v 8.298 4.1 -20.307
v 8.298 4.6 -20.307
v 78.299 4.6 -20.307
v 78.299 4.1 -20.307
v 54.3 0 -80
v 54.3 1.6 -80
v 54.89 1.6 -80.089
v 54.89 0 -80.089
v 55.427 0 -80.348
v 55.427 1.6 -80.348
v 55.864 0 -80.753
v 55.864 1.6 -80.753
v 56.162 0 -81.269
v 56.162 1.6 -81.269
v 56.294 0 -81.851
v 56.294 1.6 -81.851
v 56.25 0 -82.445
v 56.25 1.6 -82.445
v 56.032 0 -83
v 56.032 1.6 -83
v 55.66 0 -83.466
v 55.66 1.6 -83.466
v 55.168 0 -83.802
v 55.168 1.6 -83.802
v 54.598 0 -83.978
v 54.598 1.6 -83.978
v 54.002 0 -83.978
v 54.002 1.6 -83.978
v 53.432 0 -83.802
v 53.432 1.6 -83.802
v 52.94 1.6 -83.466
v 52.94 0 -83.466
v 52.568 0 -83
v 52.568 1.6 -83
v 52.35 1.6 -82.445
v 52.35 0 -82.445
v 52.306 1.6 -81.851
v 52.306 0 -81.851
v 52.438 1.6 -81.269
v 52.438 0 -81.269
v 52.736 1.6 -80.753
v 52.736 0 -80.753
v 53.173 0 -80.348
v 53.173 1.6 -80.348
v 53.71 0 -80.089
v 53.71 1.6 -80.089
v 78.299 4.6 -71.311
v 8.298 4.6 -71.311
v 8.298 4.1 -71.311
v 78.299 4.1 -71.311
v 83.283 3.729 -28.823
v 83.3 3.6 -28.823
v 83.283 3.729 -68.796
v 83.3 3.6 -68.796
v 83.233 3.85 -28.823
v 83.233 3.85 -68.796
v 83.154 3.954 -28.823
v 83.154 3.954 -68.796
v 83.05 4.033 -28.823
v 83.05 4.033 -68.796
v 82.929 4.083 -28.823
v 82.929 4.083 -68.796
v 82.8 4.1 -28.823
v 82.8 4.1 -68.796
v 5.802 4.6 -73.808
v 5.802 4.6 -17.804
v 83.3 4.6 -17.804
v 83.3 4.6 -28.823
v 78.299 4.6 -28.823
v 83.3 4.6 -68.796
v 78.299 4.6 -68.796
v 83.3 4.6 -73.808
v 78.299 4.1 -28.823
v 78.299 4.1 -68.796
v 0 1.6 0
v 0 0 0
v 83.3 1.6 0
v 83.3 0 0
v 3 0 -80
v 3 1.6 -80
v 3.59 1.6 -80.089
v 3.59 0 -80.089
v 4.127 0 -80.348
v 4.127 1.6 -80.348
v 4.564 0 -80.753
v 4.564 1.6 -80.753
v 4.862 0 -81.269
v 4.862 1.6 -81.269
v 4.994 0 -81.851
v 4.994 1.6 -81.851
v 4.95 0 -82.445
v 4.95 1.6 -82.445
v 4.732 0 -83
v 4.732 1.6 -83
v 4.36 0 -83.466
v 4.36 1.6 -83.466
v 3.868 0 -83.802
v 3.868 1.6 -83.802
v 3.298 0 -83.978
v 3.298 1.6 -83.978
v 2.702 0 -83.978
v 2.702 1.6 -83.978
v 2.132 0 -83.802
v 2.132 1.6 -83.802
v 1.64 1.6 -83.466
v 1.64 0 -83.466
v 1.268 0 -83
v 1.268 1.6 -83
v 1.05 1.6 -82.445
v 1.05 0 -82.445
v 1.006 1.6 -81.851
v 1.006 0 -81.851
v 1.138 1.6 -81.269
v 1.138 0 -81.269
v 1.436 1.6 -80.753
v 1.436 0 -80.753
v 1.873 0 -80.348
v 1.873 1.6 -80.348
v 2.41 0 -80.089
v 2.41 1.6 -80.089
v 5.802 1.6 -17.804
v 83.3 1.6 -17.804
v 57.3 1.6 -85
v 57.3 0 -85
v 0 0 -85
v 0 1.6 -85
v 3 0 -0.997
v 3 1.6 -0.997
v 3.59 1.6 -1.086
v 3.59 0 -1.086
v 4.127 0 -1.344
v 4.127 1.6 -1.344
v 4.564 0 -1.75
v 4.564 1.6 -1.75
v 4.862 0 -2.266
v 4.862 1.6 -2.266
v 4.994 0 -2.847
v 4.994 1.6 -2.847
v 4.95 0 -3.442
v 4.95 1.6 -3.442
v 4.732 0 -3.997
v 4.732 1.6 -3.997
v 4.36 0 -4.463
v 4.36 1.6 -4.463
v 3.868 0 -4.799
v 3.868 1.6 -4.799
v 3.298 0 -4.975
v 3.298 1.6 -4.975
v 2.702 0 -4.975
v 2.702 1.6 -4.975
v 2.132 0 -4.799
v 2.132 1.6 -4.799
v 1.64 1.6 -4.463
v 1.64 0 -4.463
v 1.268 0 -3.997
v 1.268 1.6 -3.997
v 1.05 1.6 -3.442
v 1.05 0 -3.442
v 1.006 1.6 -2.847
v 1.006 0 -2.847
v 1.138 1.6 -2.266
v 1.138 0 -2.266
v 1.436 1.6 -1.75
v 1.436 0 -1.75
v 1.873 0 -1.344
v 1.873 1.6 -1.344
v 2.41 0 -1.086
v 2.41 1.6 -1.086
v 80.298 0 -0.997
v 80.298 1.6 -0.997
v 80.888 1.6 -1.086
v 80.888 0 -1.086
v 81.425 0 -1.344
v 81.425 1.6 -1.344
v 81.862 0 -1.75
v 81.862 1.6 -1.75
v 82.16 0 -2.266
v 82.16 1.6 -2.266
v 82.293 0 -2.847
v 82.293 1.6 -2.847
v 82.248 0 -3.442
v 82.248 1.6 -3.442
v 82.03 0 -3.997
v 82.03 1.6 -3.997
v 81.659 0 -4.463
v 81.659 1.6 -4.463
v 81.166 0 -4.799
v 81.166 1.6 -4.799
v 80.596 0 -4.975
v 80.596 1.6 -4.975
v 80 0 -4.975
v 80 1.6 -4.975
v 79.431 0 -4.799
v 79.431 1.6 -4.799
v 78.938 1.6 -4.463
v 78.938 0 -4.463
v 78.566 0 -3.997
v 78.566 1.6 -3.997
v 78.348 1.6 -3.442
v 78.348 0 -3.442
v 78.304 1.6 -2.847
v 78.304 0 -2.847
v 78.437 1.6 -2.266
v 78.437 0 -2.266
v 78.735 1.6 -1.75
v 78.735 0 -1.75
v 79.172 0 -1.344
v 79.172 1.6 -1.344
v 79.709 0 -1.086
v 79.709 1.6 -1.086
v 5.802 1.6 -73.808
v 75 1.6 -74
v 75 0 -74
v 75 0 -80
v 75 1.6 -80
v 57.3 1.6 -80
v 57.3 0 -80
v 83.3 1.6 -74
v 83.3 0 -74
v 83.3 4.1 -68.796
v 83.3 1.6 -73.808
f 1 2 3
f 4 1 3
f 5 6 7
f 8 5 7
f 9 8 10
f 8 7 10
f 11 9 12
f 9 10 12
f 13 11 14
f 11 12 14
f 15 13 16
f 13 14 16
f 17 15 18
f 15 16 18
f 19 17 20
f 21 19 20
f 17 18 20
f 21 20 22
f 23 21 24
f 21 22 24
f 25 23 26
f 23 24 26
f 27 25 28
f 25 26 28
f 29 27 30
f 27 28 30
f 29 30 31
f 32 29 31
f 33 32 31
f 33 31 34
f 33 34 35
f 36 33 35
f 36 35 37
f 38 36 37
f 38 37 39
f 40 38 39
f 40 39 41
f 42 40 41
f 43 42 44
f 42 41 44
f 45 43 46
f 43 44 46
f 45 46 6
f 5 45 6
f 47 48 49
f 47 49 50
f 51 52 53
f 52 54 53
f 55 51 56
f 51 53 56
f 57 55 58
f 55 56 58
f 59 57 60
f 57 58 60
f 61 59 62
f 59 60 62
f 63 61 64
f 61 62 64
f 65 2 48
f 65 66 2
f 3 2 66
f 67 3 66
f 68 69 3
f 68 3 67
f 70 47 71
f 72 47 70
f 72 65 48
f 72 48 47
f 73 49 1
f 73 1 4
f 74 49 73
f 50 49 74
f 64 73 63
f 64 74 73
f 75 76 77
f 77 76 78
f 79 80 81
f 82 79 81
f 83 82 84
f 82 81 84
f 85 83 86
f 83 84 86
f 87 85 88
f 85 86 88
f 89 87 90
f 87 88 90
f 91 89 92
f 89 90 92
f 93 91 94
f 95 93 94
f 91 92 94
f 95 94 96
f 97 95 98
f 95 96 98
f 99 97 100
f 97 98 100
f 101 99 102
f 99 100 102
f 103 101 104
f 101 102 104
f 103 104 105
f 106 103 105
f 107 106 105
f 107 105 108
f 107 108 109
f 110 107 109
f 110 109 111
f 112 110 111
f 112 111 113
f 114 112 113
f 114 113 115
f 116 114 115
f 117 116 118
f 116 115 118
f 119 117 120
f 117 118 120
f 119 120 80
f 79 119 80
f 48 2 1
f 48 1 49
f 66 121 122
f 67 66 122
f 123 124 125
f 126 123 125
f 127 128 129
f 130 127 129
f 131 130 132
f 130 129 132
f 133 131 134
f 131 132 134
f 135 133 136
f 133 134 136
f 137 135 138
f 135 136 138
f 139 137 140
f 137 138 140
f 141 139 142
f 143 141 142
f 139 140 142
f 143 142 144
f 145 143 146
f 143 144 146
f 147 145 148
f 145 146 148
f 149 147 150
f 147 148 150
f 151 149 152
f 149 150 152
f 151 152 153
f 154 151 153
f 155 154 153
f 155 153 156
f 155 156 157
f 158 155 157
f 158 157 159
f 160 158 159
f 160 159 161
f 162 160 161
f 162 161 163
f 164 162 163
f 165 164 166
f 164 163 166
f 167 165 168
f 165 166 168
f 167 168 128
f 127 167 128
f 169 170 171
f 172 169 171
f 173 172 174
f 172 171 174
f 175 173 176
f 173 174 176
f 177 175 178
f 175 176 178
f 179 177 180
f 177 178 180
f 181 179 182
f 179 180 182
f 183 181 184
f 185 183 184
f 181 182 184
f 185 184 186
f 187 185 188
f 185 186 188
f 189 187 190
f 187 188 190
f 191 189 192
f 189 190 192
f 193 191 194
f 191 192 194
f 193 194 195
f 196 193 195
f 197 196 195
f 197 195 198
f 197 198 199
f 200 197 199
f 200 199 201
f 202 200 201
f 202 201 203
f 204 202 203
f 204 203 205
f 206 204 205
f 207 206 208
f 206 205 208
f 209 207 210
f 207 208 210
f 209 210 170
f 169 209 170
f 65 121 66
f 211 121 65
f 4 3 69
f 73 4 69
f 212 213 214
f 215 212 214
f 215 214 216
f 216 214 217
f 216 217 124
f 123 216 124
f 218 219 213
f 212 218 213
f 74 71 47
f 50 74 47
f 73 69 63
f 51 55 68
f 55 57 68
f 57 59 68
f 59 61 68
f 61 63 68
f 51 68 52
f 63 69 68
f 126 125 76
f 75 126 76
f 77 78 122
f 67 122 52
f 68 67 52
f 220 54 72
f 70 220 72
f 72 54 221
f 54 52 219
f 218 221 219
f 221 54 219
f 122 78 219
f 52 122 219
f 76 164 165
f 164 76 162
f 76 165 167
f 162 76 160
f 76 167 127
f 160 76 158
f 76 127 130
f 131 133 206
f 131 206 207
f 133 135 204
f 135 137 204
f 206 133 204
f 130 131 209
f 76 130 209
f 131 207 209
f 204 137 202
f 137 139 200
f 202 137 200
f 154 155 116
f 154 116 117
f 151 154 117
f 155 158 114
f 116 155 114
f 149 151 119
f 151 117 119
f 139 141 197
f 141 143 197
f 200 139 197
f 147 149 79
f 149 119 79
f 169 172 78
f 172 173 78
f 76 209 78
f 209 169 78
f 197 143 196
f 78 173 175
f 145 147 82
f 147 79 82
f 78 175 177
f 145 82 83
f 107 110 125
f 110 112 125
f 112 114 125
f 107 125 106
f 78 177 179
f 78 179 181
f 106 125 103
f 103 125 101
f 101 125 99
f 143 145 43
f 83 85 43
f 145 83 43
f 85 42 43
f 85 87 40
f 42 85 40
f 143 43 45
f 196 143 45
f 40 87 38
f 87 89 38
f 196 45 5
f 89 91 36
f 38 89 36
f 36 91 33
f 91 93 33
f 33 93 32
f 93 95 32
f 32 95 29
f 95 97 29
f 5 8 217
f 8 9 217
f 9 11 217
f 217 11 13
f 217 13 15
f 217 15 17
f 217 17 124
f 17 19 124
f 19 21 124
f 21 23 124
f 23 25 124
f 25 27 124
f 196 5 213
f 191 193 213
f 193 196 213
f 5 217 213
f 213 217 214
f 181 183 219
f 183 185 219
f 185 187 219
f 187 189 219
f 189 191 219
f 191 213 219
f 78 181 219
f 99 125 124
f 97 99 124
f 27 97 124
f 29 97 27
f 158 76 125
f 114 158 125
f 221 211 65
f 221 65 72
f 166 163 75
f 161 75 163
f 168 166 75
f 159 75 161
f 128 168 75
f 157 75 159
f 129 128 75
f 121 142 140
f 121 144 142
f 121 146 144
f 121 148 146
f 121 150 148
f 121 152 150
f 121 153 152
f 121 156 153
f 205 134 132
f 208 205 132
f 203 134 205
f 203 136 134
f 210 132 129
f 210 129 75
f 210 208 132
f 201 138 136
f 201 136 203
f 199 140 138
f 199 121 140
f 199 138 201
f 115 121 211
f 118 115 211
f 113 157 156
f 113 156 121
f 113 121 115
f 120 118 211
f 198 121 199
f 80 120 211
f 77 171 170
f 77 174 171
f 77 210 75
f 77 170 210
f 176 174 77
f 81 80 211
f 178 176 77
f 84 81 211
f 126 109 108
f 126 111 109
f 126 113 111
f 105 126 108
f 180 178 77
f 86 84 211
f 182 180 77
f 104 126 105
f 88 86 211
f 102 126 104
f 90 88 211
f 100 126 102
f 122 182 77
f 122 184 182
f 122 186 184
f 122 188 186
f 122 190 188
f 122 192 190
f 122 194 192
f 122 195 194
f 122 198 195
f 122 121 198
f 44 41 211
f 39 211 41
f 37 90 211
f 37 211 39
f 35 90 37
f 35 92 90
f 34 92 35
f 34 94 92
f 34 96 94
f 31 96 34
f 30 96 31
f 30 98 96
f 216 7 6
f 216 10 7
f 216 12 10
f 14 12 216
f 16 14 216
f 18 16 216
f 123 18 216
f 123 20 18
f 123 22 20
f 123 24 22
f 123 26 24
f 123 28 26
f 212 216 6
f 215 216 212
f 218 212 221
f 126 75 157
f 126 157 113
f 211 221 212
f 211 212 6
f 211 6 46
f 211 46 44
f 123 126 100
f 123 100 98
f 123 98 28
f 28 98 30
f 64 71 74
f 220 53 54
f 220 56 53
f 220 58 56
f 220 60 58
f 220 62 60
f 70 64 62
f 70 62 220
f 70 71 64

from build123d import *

# Parameters (mm, degrees)
BOSS_EXTRU_1_DEPTH      = 1.6
ESQUISSE5_R             = 2
ENL_V_MAT_EXTRU_1_DEPTH = 1.6
ECRAN_W                 = 77.498087901
ECRAN_H                 = 56.00411385
BOSS_EXTRU_2_DEPTH      = 3
ECRAN_NOIR_W            = 70.00084158
ECRAN_NOIR_H            = 51.004481936
ENL_V_MAT_EXTRU_2_DEPTH = 0.5
NAPPE_CONTACTEURS_W     = 5.000690241
NAPPE_CONTACTEURS_H     = 39.972572183
ENL_V_MAT_EXTRU_3_DEPTH = 0.5
CONG_1_R                = 0.5


with BuildPart() as part:
    # Esquisse1 → Boss.-Extru.1 (new body)
    with BuildSketch(Plane(origin=(0, 0, 0), x_dir=(1, 0, 0), z_dir=(0, 1, 0))):
        Polygon((0, 0), (83.3, 0), (83.3, 74), (75, 74), (75, 80), (57.3, 80), (57.3, 85), (0, 85), align=None)
    extrude(amount=BOSS_EXTRU_1_DEPTH)

    # Esquisse5 → Enlèv. mat.-Extru.1 (cut)
    with BuildSketch(Plane(origin=(0, 1.6, 0), x_dir=(1, 0, 0), z_dir=(0, 1, 0))):
        with Locations(Location((54.3, 82, 0), (0, 0, 270))):
            Circle(ESQUISSE5_R)
        with Locations(Location((3, 82, 0), (0, 0, 270))):
            Circle(ESQUISSE5_R)
        with Locations(Location((3, 2.996959755, 0), (0, 0, 270))):
            Circle(ESQUISSE5_R)
        with Locations(Location((80.298286248, 2.996959755, 0), (0, 0, 270))):
            Circle(ESQUISSE5_R)
    extrude(amount=-ENL_V_MAT_EXTRU_1_DEPTH, mode=Mode.SUBTRACT)

    # ecran → Boss.-Extru.2 (add)
    with BuildSketch(Plane(origin=(0, 1.6, 0), x_dir=(1, 0, 0), z_dir=(0, 1, 0))):
        with Locations((44.55095605, 45.806316508)):
            Rectangle(ECRAN_W, ECRAN_H)
    extrude(amount=BOSS_EXTRU_2_DEPTH)

    # ecran noir → Enlèv. mat.-Extru.2 (cut)
    with BuildSketch(Plane(origin=(0, 4.6, 0), x_dir=(1, 0, 0), z_dir=(0, 1, 0))):
        with Locations((43.298888969, 45.808865656)):
            Rectangle(ECRAN_NOIR_W, ECRAN_NOIR_H)
    extrude(amount=-ENL_V_MAT_EXTRU_2_DEPTH, mode=Mode.SUBTRACT)

    # nappe contacteurs → Enlèv. mat.-Extru.3 (cut)
    with BuildSketch(Plane(origin=(0, 4.6, 0), x_dir=(1, 0, 0), z_dir=(0, 1, 0))):
        with Locations((80.79965488, 48.80952599)):
            Rectangle(NAPPE_CONTACTEURS_W, NAPPE_CONTACTEURS_H)
    extrude(amount=-ENL_V_MAT_EXTRU_3_DEPTH, mode=Mode.SUBTRACT)

    # Congé1
    cong_1_edges = [part.edges().sort_by_distance(p)[0] for p in [
        (83.3, 4.1, -48.809525991),
    ]]
    fillet(cong_1_edges, radius=CONG_1_R)


solid = part.part
